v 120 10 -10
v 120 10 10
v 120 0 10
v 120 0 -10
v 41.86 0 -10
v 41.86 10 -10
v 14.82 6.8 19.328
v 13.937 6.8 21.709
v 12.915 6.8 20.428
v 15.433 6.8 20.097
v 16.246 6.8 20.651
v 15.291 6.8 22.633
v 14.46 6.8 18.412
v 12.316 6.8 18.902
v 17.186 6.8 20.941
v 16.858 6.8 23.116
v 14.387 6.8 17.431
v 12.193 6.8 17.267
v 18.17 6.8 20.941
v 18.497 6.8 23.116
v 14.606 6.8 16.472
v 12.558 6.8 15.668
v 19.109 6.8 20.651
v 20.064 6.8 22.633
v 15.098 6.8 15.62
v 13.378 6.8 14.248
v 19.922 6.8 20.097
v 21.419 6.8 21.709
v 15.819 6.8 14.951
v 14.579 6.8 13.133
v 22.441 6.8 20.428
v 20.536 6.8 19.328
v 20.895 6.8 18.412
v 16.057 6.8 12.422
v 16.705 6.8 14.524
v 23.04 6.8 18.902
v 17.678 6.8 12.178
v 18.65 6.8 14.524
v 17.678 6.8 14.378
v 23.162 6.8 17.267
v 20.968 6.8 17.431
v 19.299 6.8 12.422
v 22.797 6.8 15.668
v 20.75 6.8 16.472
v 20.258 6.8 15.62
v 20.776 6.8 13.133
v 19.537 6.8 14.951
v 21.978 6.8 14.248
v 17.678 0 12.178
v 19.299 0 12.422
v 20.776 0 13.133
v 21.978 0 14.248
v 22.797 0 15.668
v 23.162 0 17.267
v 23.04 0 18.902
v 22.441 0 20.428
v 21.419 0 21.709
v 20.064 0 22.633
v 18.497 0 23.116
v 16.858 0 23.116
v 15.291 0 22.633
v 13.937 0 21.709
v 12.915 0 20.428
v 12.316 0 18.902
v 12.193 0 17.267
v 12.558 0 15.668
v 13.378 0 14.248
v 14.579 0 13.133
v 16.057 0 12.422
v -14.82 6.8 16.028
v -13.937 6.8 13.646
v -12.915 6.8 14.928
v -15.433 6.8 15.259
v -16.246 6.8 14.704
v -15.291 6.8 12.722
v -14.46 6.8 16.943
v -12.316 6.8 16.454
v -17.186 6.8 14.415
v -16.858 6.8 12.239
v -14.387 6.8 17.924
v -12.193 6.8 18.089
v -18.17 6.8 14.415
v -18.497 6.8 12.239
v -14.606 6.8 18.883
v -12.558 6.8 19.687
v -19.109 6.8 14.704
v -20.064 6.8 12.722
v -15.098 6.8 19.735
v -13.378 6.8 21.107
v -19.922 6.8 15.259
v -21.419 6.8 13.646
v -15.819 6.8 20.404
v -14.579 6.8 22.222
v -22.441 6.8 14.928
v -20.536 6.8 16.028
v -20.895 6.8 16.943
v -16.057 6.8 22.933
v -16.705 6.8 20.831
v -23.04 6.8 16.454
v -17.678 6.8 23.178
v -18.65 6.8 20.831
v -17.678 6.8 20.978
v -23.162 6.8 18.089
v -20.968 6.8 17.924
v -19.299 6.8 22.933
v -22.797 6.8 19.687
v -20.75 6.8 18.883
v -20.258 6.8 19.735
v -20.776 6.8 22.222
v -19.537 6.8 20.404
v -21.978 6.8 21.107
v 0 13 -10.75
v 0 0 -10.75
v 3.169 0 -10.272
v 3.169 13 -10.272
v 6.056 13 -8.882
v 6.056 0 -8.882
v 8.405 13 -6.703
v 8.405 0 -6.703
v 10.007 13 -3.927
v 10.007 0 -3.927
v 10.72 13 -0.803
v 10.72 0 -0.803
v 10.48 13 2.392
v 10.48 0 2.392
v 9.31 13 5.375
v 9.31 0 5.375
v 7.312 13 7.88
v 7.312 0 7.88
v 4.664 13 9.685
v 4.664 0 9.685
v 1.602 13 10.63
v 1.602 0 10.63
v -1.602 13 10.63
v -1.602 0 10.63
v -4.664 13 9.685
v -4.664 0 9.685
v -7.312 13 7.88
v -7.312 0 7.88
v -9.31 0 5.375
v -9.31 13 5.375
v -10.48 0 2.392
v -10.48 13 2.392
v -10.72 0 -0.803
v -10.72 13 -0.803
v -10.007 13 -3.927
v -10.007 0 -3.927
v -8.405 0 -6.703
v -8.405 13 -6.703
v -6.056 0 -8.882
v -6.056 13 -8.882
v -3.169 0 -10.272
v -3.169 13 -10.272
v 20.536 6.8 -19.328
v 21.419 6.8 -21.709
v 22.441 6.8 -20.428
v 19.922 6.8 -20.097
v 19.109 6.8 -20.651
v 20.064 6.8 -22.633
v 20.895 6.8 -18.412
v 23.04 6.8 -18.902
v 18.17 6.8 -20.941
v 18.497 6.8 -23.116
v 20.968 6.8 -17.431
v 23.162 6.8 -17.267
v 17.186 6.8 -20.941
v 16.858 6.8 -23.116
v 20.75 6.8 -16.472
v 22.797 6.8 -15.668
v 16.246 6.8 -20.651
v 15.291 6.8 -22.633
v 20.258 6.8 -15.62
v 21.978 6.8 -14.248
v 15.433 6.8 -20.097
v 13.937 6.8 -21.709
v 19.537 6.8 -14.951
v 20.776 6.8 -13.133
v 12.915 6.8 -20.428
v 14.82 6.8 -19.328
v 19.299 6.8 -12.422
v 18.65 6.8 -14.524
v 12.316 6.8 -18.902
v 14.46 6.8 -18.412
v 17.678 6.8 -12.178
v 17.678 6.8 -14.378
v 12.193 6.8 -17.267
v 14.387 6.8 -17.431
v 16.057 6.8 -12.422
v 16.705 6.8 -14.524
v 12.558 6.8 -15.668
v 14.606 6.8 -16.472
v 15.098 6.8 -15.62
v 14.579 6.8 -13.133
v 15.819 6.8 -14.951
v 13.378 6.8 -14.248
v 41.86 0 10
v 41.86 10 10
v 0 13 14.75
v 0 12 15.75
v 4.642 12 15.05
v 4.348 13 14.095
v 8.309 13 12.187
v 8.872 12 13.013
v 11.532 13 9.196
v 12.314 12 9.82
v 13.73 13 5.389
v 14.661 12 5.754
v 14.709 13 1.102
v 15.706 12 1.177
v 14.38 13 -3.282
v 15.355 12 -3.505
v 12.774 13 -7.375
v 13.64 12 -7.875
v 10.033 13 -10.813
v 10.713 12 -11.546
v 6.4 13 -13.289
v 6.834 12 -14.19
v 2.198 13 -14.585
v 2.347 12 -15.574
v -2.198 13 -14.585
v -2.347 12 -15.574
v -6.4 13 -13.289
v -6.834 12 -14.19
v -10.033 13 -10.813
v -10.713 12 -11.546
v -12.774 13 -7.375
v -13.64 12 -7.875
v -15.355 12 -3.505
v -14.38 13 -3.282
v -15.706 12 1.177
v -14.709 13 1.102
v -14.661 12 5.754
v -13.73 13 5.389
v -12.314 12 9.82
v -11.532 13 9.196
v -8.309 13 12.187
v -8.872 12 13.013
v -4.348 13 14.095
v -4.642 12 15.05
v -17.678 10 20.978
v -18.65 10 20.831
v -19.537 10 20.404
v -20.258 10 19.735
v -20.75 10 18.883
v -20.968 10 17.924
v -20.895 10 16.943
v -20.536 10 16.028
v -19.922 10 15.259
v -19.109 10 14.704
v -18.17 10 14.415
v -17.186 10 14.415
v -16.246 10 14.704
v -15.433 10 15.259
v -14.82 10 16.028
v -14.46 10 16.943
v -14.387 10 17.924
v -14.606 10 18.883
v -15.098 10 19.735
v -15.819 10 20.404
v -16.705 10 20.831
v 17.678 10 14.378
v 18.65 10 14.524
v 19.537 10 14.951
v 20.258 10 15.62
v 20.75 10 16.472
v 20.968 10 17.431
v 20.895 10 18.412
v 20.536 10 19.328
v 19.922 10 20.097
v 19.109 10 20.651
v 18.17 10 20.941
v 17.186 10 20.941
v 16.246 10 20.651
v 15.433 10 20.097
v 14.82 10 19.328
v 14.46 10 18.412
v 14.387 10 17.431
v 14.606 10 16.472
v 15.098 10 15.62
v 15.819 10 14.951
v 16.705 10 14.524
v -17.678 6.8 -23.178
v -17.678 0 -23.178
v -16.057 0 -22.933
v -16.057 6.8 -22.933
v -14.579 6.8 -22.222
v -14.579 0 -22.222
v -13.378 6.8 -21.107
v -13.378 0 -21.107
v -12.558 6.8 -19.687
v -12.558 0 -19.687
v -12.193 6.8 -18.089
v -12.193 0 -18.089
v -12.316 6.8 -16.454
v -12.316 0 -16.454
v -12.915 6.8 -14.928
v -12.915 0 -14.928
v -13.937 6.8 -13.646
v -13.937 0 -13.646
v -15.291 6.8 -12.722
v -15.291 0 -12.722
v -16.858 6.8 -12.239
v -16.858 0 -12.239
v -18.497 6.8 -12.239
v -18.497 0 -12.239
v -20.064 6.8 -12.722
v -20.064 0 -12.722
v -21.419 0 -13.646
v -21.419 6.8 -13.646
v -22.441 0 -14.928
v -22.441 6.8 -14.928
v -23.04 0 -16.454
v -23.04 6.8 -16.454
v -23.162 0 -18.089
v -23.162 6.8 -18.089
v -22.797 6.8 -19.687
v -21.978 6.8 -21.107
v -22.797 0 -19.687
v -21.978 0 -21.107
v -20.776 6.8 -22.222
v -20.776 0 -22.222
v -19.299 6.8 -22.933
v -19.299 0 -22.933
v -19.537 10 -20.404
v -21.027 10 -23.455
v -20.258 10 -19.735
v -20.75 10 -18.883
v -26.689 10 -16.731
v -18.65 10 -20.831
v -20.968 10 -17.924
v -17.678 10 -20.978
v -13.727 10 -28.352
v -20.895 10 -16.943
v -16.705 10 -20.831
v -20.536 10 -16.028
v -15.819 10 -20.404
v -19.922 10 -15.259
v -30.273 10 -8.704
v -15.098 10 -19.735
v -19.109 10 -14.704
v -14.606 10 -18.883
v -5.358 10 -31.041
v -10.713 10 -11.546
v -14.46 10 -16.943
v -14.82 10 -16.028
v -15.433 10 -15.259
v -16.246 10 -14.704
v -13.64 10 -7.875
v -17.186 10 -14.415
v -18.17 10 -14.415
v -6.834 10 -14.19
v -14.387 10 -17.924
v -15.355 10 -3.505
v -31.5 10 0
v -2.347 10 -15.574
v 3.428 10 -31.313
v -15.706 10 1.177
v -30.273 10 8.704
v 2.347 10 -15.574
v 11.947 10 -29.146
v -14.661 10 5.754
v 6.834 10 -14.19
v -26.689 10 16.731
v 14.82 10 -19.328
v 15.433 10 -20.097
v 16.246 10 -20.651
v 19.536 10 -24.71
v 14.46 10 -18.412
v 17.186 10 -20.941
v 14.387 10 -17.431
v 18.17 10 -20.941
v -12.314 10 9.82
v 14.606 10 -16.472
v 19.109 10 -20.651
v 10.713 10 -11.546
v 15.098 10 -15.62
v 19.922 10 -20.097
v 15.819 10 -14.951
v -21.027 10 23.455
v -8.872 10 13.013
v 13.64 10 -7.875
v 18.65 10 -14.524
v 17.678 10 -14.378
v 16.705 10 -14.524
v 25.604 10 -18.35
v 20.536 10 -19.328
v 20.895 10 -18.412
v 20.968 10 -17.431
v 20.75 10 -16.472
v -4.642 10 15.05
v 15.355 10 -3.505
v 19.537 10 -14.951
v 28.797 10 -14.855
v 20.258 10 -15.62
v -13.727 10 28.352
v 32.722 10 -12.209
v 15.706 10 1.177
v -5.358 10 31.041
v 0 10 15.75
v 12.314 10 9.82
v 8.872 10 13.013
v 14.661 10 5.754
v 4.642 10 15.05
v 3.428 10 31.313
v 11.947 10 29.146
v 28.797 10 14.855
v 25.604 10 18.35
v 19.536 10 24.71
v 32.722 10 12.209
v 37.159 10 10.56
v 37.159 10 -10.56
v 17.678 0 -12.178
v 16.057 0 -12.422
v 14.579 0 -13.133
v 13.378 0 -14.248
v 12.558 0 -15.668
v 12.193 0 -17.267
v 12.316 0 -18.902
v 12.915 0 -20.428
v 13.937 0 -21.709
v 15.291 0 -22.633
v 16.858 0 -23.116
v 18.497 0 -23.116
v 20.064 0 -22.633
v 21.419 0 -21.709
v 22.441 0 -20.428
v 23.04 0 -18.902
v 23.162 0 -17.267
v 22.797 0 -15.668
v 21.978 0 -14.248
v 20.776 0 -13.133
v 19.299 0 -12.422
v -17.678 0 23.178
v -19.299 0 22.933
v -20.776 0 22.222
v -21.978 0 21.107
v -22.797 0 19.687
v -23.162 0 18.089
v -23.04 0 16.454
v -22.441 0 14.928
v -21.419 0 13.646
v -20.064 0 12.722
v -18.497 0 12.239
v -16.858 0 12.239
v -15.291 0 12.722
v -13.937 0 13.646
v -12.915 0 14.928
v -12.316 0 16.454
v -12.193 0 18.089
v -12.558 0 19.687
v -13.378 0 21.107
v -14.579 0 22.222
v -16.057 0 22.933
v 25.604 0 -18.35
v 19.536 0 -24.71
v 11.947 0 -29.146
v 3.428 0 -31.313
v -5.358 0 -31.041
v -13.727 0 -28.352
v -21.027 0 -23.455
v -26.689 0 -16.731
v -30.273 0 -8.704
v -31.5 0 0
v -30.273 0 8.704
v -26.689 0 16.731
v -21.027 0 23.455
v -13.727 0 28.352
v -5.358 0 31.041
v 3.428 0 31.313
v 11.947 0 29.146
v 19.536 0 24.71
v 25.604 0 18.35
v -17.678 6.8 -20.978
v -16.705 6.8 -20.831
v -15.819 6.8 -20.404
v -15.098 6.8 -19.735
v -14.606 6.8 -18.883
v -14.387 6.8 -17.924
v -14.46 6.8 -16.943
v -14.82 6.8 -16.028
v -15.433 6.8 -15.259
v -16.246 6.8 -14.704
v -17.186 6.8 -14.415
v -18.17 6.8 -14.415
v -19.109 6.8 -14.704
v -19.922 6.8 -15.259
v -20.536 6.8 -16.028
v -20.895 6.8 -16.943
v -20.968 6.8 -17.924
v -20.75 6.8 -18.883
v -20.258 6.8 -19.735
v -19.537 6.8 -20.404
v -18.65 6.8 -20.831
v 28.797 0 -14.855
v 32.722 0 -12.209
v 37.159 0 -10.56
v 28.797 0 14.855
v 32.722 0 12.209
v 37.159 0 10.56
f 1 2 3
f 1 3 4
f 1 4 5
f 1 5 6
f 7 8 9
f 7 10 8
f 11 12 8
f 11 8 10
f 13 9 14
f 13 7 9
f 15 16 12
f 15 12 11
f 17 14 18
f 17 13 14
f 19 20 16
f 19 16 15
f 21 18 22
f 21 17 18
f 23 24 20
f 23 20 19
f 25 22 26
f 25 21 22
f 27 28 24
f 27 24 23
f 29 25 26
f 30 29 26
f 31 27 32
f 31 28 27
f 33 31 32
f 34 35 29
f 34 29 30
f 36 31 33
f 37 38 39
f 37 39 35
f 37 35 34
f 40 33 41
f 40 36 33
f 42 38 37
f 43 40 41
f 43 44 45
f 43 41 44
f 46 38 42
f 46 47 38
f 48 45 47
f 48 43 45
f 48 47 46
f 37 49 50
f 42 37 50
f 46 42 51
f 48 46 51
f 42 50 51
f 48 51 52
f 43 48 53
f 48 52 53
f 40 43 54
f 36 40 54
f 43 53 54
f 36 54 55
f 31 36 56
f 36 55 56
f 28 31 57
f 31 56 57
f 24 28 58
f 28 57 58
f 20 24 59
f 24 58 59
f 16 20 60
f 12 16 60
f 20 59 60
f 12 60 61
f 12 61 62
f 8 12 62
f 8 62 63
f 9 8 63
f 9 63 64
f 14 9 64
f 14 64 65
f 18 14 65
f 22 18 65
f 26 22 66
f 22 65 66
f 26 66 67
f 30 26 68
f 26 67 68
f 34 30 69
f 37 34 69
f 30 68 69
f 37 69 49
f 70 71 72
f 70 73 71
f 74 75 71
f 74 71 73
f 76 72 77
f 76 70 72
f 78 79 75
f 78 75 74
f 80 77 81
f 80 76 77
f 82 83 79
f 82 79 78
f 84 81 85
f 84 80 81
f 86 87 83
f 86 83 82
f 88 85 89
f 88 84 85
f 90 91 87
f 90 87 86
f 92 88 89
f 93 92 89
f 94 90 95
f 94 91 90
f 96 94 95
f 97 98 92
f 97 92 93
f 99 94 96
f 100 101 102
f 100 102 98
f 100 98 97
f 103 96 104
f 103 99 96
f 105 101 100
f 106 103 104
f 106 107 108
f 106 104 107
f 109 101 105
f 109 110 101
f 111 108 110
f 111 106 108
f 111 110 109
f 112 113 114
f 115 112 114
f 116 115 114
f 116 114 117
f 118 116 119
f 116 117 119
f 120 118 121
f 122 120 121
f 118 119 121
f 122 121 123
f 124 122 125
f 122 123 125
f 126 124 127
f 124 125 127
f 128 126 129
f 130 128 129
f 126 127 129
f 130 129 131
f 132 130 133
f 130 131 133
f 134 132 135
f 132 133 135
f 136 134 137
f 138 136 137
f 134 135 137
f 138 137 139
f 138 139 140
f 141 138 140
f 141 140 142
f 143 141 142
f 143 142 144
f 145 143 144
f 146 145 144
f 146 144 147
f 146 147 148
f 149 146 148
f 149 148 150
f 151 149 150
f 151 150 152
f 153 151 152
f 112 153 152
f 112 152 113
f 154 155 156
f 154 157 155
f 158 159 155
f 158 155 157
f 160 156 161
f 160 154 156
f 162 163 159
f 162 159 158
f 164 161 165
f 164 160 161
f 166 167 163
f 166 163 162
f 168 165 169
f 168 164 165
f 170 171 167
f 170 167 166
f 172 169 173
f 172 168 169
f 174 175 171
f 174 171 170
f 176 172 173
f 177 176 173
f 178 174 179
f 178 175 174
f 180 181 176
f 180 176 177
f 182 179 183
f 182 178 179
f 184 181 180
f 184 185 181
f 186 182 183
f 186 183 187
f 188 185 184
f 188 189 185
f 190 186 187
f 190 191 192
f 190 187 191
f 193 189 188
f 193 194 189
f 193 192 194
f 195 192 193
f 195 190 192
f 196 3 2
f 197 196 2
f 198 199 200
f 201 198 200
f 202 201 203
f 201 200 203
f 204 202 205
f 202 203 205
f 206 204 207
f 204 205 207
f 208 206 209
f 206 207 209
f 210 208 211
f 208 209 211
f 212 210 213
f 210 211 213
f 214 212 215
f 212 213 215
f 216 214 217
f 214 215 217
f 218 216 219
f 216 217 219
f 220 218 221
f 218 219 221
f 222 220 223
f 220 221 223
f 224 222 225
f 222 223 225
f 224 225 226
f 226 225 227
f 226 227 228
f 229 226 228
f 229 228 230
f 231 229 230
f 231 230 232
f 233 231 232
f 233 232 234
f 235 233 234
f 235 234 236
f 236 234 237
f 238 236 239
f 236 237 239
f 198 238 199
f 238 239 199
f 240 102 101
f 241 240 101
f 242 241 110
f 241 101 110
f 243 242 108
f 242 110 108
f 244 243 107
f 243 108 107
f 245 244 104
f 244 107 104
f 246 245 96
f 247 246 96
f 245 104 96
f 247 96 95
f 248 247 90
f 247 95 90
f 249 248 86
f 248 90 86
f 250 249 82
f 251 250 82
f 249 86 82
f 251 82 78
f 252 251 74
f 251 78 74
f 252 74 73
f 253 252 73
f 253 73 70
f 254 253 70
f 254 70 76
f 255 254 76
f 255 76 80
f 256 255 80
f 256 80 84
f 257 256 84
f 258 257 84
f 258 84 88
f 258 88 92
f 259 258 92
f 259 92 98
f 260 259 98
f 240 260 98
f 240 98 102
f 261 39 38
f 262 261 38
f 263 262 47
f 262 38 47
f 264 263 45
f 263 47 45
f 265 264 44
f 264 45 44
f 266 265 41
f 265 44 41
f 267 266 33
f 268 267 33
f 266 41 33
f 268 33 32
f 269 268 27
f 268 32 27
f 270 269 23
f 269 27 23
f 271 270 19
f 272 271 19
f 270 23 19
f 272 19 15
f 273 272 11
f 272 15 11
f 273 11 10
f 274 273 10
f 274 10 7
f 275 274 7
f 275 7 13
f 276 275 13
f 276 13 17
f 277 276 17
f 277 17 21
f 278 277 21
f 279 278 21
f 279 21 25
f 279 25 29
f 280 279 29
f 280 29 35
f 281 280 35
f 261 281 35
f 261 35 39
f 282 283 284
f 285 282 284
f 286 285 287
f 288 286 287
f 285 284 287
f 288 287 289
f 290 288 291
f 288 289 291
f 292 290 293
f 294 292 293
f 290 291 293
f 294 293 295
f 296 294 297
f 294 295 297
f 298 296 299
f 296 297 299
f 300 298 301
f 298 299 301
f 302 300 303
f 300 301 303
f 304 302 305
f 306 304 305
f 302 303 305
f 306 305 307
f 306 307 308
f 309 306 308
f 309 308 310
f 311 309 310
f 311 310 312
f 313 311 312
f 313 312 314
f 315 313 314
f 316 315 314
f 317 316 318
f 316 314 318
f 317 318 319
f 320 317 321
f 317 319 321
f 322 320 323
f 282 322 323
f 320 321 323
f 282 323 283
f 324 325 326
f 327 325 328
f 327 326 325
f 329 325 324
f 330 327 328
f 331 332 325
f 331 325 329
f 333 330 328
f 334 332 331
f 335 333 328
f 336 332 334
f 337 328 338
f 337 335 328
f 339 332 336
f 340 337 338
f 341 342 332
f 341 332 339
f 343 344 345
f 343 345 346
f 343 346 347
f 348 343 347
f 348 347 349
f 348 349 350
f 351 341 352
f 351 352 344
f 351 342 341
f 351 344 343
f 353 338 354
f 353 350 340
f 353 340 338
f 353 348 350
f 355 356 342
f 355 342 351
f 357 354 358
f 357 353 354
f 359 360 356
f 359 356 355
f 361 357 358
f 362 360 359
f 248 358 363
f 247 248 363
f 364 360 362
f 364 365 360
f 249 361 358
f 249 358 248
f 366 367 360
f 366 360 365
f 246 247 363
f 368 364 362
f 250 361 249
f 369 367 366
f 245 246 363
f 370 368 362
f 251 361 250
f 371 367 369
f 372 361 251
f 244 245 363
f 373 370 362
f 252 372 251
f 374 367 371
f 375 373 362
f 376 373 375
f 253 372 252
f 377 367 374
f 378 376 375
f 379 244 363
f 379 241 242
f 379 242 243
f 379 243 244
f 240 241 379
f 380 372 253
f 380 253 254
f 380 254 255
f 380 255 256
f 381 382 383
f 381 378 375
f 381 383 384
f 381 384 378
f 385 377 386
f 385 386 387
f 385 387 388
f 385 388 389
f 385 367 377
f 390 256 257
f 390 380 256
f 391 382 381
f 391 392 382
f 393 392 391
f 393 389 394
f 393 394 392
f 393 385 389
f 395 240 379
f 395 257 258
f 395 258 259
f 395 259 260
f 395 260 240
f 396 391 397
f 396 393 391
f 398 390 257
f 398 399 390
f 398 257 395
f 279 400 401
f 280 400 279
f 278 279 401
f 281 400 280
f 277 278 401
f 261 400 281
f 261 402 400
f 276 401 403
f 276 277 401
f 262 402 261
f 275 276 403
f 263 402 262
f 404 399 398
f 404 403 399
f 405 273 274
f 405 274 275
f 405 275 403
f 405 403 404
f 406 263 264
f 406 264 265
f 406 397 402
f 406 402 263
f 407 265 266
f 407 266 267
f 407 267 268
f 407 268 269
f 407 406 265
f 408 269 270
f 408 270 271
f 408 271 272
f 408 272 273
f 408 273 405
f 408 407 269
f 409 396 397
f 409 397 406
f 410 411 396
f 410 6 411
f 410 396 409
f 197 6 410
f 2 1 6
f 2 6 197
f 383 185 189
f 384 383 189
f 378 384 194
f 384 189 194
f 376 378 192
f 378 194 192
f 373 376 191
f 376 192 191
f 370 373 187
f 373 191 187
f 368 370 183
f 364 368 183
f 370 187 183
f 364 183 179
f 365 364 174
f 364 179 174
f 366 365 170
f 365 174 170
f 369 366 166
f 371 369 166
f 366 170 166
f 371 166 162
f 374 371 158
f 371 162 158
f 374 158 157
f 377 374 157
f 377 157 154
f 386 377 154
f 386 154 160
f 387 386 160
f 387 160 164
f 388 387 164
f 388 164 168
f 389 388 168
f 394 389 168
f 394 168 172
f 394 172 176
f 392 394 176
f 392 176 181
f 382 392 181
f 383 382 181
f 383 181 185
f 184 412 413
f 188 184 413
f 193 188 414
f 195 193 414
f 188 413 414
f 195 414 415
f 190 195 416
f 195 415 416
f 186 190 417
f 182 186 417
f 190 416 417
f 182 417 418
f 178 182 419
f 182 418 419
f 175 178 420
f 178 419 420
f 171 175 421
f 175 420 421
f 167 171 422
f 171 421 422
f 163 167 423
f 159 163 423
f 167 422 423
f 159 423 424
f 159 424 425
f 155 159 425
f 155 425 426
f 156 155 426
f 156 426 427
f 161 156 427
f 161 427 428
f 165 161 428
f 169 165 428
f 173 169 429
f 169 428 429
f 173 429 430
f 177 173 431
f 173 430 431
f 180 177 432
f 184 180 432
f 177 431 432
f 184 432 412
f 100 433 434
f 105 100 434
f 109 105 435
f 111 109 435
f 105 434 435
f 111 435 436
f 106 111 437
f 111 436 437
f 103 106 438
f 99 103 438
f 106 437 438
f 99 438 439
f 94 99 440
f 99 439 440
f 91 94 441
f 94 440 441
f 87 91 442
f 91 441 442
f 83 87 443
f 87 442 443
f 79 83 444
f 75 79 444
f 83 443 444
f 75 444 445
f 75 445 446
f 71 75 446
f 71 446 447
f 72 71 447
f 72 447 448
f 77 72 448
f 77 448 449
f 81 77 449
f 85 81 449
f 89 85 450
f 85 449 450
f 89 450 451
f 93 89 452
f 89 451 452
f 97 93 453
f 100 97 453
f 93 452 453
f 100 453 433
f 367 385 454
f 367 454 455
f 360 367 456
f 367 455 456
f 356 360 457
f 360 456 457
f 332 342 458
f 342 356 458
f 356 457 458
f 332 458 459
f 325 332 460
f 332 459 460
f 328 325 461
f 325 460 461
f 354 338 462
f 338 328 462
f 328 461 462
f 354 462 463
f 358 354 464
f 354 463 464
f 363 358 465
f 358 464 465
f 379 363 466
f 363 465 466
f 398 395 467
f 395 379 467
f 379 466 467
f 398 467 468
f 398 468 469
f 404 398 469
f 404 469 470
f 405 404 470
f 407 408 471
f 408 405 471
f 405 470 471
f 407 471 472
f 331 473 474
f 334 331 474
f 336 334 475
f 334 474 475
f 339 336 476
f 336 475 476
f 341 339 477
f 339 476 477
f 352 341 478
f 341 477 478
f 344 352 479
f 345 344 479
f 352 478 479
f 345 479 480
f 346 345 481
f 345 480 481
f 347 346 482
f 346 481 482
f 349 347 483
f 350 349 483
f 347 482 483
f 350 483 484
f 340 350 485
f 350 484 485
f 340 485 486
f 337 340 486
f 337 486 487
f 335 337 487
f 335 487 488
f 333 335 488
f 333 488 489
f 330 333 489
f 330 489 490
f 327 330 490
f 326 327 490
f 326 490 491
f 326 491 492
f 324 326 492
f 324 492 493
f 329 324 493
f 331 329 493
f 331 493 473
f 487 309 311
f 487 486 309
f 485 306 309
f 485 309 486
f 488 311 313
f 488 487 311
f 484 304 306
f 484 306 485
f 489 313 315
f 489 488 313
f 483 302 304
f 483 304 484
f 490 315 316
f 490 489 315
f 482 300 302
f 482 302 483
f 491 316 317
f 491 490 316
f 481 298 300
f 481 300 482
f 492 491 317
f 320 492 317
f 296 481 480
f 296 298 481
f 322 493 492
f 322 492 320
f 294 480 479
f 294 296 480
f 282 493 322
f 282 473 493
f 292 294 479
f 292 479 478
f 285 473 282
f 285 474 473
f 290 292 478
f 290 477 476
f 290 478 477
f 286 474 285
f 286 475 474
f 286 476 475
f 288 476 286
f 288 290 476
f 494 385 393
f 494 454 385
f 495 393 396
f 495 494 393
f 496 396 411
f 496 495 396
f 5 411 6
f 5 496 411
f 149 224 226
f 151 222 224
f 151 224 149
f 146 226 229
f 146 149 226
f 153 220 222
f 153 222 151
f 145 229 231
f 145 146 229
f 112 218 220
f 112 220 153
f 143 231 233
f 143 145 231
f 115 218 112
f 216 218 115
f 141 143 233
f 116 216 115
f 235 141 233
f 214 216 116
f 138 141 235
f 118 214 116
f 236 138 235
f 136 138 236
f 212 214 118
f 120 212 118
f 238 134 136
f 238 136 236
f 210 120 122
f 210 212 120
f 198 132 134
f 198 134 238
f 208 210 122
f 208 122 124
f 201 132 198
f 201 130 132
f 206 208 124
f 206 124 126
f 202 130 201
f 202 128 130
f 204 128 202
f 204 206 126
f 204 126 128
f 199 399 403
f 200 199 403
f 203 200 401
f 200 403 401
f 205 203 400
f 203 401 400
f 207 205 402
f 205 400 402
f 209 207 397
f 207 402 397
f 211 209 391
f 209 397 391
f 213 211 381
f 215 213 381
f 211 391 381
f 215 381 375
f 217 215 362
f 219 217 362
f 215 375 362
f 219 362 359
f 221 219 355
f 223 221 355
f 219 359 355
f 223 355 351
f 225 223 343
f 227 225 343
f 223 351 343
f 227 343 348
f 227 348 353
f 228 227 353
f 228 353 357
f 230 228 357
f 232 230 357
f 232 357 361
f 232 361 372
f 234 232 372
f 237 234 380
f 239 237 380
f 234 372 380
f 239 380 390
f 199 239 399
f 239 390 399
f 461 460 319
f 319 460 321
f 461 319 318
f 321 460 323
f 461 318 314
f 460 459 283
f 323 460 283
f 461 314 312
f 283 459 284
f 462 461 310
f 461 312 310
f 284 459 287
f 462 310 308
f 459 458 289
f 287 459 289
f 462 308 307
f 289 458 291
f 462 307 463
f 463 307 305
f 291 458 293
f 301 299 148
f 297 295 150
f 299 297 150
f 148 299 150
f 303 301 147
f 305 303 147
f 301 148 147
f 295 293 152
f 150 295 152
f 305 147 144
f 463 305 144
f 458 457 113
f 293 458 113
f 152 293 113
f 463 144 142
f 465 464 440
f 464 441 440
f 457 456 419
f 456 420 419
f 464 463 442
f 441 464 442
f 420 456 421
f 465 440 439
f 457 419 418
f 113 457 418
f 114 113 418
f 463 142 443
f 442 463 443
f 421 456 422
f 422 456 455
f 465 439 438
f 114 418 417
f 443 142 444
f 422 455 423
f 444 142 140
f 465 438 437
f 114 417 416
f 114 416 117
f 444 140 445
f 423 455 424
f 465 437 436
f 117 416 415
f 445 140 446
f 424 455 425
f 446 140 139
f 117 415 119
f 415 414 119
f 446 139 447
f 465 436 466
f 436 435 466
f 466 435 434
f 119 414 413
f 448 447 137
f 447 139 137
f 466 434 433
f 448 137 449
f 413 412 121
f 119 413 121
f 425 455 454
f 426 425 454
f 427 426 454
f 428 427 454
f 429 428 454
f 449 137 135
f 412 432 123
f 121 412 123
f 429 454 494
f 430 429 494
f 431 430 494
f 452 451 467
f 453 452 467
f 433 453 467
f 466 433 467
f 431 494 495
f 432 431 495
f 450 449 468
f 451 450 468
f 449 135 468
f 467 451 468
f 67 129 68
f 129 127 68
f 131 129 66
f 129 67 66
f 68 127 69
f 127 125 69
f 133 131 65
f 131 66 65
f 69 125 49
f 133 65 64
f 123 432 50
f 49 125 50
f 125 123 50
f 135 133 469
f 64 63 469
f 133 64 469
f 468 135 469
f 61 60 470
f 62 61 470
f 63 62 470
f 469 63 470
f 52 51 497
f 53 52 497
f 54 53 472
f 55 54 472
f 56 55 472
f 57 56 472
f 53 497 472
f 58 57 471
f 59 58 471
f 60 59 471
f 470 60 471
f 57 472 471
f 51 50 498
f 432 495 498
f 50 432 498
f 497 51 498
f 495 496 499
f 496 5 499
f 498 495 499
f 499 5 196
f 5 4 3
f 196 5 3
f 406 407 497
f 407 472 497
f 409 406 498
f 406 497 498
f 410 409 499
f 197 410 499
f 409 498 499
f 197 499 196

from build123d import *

# Parameters (mm, degrees)
SKETCH_2_R          = 31.5
EXTRUDE_1_DEPTH     = 10
SKETCH_3_R          = 15.75
EXTRUDE_2_DEPTH     = 3
SKETCH_5_R          = 3.3
CUT_EXTRUDE_2_DEPTH = 47.405818601
SKETCH_5_3_R        = 5.5
CUT_EXTRUDE_3_DEPTH = 6.8
SKETCH_6_W          = 20
SKETCH_6_H          = 10
EXTRUDE_3_DEPTH     = 120
SKETCH_4_R          = 10.75
CUT_EXTRUDE_4_DEPTH = 125.744739368
CHAMFER_1_SIZE      = 1
FILLET_1_R          = 20
FILLET_2_R          = 20


with BuildPart() as part:
    # 草图2 → 凸台-拉伸1 (new body)
    with BuildSketch(Plane(origin=(0, 0, 0), x_dir=(1, 0, 0), z_dir=(0, 1, 0))):
        Circle(SKETCH_2_R)
    extrude(amount=EXTRUDE_1_DEPTH)

    # 草图3 → 凸台-拉伸2 (add)
    with BuildSketch(Plane(origin=(0, 10, 0), x_dir=(1, 0, 0), z_dir=(0, 1, 0))):
        Circle(SKETCH_3_R)
    extrude(amount=EXTRUDE_2_DEPTH)

    # 草图5 → 切除-拉伸2 (cut, through all)
    with BuildSketch(Plane.XZ):
        with Locations((17.67766953, 17.67766953)):
            Circle(SKETCH_5_R)
        with Locations((-17.67766953, 17.67766953)):
            Circle(SKETCH_5_R)
        with Locations((-17.67766953, -17.67766953)):
            Circle(SKETCH_5_R)
        with Locations((17.67766953, -17.67766953)):
            Circle(SKETCH_5_R)
    extrude(amount=-CUT_EXTRUDE_2_DEPTH, mode=Mode.SUBTRACT)

    # 草图5<3> → 切除-拉伸3 (cut)
    with BuildSketch(Plane.XZ):
        with Locations((17.67766953, 17.67766953)):
            Circle(SKETCH_5_3_R)
        with Locations((-17.67766953, 17.67766953)):
            Circle(SKETCH_5_3_R)
        with Locations((-17.67766953, -17.67766953)):
            Circle(SKETCH_5_3_R)
        with Locations((17.67766953, -17.67766953)):
            Circle(SKETCH_5_3_R)
    extrude(amount=-CUT_EXTRUDE_3_DEPTH, mode=Mode.SUBTRACT)

    # 草图6 → 凸台-拉伸3 (add)
    with BuildSketch(Plane(origin=(0, 0, 0), x_dir=(0, 0, -1), z_dir=(1, 0, 0))):
        with Locations((0, 5)):
            Rectangle(SKETCH_6_W, SKETCH_6_H)
    extrude(amount=EXTRUDE_3_DEPTH)

    # 草图4 → 切除-拉伸4 (cut, through all)
    with BuildSketch(Plane(origin=(0, 0, 0), x_dir=(-1, 0, 0), z_dir=(0, -1, 0))):
        Circle(SKETCH_4_R)
    extrude(amount=-CUT_EXTRUDE_4_DEPTH, mode=Mode.SUBTRACT)

    # 倒角1
    chamfer_1_edges = [part.edges().sort_by_distance(p)[0] for p in [
        (-15.75, 13, 0),
    ]]
    chamfer(chamfer_1_edges, length=CHAMFER_1_SIZE)

    # 圆角1
    fillet_1_edges = [part.edges().sort_by_distance(p)[0] for p in [
        (29.870554062, 5, -10),
    ]]
    fillet(fillet_1_edges, radius=FILLET_1_R)

    # 圆角2
    fillet_2_edges = [part.edges().sort_by_distance(p)[0] for p in [
        (29.870554062, 5, 10),
    ]]
    fillet(fillet_2_edges, radius=FILLET_2_R)


solid = part.part
